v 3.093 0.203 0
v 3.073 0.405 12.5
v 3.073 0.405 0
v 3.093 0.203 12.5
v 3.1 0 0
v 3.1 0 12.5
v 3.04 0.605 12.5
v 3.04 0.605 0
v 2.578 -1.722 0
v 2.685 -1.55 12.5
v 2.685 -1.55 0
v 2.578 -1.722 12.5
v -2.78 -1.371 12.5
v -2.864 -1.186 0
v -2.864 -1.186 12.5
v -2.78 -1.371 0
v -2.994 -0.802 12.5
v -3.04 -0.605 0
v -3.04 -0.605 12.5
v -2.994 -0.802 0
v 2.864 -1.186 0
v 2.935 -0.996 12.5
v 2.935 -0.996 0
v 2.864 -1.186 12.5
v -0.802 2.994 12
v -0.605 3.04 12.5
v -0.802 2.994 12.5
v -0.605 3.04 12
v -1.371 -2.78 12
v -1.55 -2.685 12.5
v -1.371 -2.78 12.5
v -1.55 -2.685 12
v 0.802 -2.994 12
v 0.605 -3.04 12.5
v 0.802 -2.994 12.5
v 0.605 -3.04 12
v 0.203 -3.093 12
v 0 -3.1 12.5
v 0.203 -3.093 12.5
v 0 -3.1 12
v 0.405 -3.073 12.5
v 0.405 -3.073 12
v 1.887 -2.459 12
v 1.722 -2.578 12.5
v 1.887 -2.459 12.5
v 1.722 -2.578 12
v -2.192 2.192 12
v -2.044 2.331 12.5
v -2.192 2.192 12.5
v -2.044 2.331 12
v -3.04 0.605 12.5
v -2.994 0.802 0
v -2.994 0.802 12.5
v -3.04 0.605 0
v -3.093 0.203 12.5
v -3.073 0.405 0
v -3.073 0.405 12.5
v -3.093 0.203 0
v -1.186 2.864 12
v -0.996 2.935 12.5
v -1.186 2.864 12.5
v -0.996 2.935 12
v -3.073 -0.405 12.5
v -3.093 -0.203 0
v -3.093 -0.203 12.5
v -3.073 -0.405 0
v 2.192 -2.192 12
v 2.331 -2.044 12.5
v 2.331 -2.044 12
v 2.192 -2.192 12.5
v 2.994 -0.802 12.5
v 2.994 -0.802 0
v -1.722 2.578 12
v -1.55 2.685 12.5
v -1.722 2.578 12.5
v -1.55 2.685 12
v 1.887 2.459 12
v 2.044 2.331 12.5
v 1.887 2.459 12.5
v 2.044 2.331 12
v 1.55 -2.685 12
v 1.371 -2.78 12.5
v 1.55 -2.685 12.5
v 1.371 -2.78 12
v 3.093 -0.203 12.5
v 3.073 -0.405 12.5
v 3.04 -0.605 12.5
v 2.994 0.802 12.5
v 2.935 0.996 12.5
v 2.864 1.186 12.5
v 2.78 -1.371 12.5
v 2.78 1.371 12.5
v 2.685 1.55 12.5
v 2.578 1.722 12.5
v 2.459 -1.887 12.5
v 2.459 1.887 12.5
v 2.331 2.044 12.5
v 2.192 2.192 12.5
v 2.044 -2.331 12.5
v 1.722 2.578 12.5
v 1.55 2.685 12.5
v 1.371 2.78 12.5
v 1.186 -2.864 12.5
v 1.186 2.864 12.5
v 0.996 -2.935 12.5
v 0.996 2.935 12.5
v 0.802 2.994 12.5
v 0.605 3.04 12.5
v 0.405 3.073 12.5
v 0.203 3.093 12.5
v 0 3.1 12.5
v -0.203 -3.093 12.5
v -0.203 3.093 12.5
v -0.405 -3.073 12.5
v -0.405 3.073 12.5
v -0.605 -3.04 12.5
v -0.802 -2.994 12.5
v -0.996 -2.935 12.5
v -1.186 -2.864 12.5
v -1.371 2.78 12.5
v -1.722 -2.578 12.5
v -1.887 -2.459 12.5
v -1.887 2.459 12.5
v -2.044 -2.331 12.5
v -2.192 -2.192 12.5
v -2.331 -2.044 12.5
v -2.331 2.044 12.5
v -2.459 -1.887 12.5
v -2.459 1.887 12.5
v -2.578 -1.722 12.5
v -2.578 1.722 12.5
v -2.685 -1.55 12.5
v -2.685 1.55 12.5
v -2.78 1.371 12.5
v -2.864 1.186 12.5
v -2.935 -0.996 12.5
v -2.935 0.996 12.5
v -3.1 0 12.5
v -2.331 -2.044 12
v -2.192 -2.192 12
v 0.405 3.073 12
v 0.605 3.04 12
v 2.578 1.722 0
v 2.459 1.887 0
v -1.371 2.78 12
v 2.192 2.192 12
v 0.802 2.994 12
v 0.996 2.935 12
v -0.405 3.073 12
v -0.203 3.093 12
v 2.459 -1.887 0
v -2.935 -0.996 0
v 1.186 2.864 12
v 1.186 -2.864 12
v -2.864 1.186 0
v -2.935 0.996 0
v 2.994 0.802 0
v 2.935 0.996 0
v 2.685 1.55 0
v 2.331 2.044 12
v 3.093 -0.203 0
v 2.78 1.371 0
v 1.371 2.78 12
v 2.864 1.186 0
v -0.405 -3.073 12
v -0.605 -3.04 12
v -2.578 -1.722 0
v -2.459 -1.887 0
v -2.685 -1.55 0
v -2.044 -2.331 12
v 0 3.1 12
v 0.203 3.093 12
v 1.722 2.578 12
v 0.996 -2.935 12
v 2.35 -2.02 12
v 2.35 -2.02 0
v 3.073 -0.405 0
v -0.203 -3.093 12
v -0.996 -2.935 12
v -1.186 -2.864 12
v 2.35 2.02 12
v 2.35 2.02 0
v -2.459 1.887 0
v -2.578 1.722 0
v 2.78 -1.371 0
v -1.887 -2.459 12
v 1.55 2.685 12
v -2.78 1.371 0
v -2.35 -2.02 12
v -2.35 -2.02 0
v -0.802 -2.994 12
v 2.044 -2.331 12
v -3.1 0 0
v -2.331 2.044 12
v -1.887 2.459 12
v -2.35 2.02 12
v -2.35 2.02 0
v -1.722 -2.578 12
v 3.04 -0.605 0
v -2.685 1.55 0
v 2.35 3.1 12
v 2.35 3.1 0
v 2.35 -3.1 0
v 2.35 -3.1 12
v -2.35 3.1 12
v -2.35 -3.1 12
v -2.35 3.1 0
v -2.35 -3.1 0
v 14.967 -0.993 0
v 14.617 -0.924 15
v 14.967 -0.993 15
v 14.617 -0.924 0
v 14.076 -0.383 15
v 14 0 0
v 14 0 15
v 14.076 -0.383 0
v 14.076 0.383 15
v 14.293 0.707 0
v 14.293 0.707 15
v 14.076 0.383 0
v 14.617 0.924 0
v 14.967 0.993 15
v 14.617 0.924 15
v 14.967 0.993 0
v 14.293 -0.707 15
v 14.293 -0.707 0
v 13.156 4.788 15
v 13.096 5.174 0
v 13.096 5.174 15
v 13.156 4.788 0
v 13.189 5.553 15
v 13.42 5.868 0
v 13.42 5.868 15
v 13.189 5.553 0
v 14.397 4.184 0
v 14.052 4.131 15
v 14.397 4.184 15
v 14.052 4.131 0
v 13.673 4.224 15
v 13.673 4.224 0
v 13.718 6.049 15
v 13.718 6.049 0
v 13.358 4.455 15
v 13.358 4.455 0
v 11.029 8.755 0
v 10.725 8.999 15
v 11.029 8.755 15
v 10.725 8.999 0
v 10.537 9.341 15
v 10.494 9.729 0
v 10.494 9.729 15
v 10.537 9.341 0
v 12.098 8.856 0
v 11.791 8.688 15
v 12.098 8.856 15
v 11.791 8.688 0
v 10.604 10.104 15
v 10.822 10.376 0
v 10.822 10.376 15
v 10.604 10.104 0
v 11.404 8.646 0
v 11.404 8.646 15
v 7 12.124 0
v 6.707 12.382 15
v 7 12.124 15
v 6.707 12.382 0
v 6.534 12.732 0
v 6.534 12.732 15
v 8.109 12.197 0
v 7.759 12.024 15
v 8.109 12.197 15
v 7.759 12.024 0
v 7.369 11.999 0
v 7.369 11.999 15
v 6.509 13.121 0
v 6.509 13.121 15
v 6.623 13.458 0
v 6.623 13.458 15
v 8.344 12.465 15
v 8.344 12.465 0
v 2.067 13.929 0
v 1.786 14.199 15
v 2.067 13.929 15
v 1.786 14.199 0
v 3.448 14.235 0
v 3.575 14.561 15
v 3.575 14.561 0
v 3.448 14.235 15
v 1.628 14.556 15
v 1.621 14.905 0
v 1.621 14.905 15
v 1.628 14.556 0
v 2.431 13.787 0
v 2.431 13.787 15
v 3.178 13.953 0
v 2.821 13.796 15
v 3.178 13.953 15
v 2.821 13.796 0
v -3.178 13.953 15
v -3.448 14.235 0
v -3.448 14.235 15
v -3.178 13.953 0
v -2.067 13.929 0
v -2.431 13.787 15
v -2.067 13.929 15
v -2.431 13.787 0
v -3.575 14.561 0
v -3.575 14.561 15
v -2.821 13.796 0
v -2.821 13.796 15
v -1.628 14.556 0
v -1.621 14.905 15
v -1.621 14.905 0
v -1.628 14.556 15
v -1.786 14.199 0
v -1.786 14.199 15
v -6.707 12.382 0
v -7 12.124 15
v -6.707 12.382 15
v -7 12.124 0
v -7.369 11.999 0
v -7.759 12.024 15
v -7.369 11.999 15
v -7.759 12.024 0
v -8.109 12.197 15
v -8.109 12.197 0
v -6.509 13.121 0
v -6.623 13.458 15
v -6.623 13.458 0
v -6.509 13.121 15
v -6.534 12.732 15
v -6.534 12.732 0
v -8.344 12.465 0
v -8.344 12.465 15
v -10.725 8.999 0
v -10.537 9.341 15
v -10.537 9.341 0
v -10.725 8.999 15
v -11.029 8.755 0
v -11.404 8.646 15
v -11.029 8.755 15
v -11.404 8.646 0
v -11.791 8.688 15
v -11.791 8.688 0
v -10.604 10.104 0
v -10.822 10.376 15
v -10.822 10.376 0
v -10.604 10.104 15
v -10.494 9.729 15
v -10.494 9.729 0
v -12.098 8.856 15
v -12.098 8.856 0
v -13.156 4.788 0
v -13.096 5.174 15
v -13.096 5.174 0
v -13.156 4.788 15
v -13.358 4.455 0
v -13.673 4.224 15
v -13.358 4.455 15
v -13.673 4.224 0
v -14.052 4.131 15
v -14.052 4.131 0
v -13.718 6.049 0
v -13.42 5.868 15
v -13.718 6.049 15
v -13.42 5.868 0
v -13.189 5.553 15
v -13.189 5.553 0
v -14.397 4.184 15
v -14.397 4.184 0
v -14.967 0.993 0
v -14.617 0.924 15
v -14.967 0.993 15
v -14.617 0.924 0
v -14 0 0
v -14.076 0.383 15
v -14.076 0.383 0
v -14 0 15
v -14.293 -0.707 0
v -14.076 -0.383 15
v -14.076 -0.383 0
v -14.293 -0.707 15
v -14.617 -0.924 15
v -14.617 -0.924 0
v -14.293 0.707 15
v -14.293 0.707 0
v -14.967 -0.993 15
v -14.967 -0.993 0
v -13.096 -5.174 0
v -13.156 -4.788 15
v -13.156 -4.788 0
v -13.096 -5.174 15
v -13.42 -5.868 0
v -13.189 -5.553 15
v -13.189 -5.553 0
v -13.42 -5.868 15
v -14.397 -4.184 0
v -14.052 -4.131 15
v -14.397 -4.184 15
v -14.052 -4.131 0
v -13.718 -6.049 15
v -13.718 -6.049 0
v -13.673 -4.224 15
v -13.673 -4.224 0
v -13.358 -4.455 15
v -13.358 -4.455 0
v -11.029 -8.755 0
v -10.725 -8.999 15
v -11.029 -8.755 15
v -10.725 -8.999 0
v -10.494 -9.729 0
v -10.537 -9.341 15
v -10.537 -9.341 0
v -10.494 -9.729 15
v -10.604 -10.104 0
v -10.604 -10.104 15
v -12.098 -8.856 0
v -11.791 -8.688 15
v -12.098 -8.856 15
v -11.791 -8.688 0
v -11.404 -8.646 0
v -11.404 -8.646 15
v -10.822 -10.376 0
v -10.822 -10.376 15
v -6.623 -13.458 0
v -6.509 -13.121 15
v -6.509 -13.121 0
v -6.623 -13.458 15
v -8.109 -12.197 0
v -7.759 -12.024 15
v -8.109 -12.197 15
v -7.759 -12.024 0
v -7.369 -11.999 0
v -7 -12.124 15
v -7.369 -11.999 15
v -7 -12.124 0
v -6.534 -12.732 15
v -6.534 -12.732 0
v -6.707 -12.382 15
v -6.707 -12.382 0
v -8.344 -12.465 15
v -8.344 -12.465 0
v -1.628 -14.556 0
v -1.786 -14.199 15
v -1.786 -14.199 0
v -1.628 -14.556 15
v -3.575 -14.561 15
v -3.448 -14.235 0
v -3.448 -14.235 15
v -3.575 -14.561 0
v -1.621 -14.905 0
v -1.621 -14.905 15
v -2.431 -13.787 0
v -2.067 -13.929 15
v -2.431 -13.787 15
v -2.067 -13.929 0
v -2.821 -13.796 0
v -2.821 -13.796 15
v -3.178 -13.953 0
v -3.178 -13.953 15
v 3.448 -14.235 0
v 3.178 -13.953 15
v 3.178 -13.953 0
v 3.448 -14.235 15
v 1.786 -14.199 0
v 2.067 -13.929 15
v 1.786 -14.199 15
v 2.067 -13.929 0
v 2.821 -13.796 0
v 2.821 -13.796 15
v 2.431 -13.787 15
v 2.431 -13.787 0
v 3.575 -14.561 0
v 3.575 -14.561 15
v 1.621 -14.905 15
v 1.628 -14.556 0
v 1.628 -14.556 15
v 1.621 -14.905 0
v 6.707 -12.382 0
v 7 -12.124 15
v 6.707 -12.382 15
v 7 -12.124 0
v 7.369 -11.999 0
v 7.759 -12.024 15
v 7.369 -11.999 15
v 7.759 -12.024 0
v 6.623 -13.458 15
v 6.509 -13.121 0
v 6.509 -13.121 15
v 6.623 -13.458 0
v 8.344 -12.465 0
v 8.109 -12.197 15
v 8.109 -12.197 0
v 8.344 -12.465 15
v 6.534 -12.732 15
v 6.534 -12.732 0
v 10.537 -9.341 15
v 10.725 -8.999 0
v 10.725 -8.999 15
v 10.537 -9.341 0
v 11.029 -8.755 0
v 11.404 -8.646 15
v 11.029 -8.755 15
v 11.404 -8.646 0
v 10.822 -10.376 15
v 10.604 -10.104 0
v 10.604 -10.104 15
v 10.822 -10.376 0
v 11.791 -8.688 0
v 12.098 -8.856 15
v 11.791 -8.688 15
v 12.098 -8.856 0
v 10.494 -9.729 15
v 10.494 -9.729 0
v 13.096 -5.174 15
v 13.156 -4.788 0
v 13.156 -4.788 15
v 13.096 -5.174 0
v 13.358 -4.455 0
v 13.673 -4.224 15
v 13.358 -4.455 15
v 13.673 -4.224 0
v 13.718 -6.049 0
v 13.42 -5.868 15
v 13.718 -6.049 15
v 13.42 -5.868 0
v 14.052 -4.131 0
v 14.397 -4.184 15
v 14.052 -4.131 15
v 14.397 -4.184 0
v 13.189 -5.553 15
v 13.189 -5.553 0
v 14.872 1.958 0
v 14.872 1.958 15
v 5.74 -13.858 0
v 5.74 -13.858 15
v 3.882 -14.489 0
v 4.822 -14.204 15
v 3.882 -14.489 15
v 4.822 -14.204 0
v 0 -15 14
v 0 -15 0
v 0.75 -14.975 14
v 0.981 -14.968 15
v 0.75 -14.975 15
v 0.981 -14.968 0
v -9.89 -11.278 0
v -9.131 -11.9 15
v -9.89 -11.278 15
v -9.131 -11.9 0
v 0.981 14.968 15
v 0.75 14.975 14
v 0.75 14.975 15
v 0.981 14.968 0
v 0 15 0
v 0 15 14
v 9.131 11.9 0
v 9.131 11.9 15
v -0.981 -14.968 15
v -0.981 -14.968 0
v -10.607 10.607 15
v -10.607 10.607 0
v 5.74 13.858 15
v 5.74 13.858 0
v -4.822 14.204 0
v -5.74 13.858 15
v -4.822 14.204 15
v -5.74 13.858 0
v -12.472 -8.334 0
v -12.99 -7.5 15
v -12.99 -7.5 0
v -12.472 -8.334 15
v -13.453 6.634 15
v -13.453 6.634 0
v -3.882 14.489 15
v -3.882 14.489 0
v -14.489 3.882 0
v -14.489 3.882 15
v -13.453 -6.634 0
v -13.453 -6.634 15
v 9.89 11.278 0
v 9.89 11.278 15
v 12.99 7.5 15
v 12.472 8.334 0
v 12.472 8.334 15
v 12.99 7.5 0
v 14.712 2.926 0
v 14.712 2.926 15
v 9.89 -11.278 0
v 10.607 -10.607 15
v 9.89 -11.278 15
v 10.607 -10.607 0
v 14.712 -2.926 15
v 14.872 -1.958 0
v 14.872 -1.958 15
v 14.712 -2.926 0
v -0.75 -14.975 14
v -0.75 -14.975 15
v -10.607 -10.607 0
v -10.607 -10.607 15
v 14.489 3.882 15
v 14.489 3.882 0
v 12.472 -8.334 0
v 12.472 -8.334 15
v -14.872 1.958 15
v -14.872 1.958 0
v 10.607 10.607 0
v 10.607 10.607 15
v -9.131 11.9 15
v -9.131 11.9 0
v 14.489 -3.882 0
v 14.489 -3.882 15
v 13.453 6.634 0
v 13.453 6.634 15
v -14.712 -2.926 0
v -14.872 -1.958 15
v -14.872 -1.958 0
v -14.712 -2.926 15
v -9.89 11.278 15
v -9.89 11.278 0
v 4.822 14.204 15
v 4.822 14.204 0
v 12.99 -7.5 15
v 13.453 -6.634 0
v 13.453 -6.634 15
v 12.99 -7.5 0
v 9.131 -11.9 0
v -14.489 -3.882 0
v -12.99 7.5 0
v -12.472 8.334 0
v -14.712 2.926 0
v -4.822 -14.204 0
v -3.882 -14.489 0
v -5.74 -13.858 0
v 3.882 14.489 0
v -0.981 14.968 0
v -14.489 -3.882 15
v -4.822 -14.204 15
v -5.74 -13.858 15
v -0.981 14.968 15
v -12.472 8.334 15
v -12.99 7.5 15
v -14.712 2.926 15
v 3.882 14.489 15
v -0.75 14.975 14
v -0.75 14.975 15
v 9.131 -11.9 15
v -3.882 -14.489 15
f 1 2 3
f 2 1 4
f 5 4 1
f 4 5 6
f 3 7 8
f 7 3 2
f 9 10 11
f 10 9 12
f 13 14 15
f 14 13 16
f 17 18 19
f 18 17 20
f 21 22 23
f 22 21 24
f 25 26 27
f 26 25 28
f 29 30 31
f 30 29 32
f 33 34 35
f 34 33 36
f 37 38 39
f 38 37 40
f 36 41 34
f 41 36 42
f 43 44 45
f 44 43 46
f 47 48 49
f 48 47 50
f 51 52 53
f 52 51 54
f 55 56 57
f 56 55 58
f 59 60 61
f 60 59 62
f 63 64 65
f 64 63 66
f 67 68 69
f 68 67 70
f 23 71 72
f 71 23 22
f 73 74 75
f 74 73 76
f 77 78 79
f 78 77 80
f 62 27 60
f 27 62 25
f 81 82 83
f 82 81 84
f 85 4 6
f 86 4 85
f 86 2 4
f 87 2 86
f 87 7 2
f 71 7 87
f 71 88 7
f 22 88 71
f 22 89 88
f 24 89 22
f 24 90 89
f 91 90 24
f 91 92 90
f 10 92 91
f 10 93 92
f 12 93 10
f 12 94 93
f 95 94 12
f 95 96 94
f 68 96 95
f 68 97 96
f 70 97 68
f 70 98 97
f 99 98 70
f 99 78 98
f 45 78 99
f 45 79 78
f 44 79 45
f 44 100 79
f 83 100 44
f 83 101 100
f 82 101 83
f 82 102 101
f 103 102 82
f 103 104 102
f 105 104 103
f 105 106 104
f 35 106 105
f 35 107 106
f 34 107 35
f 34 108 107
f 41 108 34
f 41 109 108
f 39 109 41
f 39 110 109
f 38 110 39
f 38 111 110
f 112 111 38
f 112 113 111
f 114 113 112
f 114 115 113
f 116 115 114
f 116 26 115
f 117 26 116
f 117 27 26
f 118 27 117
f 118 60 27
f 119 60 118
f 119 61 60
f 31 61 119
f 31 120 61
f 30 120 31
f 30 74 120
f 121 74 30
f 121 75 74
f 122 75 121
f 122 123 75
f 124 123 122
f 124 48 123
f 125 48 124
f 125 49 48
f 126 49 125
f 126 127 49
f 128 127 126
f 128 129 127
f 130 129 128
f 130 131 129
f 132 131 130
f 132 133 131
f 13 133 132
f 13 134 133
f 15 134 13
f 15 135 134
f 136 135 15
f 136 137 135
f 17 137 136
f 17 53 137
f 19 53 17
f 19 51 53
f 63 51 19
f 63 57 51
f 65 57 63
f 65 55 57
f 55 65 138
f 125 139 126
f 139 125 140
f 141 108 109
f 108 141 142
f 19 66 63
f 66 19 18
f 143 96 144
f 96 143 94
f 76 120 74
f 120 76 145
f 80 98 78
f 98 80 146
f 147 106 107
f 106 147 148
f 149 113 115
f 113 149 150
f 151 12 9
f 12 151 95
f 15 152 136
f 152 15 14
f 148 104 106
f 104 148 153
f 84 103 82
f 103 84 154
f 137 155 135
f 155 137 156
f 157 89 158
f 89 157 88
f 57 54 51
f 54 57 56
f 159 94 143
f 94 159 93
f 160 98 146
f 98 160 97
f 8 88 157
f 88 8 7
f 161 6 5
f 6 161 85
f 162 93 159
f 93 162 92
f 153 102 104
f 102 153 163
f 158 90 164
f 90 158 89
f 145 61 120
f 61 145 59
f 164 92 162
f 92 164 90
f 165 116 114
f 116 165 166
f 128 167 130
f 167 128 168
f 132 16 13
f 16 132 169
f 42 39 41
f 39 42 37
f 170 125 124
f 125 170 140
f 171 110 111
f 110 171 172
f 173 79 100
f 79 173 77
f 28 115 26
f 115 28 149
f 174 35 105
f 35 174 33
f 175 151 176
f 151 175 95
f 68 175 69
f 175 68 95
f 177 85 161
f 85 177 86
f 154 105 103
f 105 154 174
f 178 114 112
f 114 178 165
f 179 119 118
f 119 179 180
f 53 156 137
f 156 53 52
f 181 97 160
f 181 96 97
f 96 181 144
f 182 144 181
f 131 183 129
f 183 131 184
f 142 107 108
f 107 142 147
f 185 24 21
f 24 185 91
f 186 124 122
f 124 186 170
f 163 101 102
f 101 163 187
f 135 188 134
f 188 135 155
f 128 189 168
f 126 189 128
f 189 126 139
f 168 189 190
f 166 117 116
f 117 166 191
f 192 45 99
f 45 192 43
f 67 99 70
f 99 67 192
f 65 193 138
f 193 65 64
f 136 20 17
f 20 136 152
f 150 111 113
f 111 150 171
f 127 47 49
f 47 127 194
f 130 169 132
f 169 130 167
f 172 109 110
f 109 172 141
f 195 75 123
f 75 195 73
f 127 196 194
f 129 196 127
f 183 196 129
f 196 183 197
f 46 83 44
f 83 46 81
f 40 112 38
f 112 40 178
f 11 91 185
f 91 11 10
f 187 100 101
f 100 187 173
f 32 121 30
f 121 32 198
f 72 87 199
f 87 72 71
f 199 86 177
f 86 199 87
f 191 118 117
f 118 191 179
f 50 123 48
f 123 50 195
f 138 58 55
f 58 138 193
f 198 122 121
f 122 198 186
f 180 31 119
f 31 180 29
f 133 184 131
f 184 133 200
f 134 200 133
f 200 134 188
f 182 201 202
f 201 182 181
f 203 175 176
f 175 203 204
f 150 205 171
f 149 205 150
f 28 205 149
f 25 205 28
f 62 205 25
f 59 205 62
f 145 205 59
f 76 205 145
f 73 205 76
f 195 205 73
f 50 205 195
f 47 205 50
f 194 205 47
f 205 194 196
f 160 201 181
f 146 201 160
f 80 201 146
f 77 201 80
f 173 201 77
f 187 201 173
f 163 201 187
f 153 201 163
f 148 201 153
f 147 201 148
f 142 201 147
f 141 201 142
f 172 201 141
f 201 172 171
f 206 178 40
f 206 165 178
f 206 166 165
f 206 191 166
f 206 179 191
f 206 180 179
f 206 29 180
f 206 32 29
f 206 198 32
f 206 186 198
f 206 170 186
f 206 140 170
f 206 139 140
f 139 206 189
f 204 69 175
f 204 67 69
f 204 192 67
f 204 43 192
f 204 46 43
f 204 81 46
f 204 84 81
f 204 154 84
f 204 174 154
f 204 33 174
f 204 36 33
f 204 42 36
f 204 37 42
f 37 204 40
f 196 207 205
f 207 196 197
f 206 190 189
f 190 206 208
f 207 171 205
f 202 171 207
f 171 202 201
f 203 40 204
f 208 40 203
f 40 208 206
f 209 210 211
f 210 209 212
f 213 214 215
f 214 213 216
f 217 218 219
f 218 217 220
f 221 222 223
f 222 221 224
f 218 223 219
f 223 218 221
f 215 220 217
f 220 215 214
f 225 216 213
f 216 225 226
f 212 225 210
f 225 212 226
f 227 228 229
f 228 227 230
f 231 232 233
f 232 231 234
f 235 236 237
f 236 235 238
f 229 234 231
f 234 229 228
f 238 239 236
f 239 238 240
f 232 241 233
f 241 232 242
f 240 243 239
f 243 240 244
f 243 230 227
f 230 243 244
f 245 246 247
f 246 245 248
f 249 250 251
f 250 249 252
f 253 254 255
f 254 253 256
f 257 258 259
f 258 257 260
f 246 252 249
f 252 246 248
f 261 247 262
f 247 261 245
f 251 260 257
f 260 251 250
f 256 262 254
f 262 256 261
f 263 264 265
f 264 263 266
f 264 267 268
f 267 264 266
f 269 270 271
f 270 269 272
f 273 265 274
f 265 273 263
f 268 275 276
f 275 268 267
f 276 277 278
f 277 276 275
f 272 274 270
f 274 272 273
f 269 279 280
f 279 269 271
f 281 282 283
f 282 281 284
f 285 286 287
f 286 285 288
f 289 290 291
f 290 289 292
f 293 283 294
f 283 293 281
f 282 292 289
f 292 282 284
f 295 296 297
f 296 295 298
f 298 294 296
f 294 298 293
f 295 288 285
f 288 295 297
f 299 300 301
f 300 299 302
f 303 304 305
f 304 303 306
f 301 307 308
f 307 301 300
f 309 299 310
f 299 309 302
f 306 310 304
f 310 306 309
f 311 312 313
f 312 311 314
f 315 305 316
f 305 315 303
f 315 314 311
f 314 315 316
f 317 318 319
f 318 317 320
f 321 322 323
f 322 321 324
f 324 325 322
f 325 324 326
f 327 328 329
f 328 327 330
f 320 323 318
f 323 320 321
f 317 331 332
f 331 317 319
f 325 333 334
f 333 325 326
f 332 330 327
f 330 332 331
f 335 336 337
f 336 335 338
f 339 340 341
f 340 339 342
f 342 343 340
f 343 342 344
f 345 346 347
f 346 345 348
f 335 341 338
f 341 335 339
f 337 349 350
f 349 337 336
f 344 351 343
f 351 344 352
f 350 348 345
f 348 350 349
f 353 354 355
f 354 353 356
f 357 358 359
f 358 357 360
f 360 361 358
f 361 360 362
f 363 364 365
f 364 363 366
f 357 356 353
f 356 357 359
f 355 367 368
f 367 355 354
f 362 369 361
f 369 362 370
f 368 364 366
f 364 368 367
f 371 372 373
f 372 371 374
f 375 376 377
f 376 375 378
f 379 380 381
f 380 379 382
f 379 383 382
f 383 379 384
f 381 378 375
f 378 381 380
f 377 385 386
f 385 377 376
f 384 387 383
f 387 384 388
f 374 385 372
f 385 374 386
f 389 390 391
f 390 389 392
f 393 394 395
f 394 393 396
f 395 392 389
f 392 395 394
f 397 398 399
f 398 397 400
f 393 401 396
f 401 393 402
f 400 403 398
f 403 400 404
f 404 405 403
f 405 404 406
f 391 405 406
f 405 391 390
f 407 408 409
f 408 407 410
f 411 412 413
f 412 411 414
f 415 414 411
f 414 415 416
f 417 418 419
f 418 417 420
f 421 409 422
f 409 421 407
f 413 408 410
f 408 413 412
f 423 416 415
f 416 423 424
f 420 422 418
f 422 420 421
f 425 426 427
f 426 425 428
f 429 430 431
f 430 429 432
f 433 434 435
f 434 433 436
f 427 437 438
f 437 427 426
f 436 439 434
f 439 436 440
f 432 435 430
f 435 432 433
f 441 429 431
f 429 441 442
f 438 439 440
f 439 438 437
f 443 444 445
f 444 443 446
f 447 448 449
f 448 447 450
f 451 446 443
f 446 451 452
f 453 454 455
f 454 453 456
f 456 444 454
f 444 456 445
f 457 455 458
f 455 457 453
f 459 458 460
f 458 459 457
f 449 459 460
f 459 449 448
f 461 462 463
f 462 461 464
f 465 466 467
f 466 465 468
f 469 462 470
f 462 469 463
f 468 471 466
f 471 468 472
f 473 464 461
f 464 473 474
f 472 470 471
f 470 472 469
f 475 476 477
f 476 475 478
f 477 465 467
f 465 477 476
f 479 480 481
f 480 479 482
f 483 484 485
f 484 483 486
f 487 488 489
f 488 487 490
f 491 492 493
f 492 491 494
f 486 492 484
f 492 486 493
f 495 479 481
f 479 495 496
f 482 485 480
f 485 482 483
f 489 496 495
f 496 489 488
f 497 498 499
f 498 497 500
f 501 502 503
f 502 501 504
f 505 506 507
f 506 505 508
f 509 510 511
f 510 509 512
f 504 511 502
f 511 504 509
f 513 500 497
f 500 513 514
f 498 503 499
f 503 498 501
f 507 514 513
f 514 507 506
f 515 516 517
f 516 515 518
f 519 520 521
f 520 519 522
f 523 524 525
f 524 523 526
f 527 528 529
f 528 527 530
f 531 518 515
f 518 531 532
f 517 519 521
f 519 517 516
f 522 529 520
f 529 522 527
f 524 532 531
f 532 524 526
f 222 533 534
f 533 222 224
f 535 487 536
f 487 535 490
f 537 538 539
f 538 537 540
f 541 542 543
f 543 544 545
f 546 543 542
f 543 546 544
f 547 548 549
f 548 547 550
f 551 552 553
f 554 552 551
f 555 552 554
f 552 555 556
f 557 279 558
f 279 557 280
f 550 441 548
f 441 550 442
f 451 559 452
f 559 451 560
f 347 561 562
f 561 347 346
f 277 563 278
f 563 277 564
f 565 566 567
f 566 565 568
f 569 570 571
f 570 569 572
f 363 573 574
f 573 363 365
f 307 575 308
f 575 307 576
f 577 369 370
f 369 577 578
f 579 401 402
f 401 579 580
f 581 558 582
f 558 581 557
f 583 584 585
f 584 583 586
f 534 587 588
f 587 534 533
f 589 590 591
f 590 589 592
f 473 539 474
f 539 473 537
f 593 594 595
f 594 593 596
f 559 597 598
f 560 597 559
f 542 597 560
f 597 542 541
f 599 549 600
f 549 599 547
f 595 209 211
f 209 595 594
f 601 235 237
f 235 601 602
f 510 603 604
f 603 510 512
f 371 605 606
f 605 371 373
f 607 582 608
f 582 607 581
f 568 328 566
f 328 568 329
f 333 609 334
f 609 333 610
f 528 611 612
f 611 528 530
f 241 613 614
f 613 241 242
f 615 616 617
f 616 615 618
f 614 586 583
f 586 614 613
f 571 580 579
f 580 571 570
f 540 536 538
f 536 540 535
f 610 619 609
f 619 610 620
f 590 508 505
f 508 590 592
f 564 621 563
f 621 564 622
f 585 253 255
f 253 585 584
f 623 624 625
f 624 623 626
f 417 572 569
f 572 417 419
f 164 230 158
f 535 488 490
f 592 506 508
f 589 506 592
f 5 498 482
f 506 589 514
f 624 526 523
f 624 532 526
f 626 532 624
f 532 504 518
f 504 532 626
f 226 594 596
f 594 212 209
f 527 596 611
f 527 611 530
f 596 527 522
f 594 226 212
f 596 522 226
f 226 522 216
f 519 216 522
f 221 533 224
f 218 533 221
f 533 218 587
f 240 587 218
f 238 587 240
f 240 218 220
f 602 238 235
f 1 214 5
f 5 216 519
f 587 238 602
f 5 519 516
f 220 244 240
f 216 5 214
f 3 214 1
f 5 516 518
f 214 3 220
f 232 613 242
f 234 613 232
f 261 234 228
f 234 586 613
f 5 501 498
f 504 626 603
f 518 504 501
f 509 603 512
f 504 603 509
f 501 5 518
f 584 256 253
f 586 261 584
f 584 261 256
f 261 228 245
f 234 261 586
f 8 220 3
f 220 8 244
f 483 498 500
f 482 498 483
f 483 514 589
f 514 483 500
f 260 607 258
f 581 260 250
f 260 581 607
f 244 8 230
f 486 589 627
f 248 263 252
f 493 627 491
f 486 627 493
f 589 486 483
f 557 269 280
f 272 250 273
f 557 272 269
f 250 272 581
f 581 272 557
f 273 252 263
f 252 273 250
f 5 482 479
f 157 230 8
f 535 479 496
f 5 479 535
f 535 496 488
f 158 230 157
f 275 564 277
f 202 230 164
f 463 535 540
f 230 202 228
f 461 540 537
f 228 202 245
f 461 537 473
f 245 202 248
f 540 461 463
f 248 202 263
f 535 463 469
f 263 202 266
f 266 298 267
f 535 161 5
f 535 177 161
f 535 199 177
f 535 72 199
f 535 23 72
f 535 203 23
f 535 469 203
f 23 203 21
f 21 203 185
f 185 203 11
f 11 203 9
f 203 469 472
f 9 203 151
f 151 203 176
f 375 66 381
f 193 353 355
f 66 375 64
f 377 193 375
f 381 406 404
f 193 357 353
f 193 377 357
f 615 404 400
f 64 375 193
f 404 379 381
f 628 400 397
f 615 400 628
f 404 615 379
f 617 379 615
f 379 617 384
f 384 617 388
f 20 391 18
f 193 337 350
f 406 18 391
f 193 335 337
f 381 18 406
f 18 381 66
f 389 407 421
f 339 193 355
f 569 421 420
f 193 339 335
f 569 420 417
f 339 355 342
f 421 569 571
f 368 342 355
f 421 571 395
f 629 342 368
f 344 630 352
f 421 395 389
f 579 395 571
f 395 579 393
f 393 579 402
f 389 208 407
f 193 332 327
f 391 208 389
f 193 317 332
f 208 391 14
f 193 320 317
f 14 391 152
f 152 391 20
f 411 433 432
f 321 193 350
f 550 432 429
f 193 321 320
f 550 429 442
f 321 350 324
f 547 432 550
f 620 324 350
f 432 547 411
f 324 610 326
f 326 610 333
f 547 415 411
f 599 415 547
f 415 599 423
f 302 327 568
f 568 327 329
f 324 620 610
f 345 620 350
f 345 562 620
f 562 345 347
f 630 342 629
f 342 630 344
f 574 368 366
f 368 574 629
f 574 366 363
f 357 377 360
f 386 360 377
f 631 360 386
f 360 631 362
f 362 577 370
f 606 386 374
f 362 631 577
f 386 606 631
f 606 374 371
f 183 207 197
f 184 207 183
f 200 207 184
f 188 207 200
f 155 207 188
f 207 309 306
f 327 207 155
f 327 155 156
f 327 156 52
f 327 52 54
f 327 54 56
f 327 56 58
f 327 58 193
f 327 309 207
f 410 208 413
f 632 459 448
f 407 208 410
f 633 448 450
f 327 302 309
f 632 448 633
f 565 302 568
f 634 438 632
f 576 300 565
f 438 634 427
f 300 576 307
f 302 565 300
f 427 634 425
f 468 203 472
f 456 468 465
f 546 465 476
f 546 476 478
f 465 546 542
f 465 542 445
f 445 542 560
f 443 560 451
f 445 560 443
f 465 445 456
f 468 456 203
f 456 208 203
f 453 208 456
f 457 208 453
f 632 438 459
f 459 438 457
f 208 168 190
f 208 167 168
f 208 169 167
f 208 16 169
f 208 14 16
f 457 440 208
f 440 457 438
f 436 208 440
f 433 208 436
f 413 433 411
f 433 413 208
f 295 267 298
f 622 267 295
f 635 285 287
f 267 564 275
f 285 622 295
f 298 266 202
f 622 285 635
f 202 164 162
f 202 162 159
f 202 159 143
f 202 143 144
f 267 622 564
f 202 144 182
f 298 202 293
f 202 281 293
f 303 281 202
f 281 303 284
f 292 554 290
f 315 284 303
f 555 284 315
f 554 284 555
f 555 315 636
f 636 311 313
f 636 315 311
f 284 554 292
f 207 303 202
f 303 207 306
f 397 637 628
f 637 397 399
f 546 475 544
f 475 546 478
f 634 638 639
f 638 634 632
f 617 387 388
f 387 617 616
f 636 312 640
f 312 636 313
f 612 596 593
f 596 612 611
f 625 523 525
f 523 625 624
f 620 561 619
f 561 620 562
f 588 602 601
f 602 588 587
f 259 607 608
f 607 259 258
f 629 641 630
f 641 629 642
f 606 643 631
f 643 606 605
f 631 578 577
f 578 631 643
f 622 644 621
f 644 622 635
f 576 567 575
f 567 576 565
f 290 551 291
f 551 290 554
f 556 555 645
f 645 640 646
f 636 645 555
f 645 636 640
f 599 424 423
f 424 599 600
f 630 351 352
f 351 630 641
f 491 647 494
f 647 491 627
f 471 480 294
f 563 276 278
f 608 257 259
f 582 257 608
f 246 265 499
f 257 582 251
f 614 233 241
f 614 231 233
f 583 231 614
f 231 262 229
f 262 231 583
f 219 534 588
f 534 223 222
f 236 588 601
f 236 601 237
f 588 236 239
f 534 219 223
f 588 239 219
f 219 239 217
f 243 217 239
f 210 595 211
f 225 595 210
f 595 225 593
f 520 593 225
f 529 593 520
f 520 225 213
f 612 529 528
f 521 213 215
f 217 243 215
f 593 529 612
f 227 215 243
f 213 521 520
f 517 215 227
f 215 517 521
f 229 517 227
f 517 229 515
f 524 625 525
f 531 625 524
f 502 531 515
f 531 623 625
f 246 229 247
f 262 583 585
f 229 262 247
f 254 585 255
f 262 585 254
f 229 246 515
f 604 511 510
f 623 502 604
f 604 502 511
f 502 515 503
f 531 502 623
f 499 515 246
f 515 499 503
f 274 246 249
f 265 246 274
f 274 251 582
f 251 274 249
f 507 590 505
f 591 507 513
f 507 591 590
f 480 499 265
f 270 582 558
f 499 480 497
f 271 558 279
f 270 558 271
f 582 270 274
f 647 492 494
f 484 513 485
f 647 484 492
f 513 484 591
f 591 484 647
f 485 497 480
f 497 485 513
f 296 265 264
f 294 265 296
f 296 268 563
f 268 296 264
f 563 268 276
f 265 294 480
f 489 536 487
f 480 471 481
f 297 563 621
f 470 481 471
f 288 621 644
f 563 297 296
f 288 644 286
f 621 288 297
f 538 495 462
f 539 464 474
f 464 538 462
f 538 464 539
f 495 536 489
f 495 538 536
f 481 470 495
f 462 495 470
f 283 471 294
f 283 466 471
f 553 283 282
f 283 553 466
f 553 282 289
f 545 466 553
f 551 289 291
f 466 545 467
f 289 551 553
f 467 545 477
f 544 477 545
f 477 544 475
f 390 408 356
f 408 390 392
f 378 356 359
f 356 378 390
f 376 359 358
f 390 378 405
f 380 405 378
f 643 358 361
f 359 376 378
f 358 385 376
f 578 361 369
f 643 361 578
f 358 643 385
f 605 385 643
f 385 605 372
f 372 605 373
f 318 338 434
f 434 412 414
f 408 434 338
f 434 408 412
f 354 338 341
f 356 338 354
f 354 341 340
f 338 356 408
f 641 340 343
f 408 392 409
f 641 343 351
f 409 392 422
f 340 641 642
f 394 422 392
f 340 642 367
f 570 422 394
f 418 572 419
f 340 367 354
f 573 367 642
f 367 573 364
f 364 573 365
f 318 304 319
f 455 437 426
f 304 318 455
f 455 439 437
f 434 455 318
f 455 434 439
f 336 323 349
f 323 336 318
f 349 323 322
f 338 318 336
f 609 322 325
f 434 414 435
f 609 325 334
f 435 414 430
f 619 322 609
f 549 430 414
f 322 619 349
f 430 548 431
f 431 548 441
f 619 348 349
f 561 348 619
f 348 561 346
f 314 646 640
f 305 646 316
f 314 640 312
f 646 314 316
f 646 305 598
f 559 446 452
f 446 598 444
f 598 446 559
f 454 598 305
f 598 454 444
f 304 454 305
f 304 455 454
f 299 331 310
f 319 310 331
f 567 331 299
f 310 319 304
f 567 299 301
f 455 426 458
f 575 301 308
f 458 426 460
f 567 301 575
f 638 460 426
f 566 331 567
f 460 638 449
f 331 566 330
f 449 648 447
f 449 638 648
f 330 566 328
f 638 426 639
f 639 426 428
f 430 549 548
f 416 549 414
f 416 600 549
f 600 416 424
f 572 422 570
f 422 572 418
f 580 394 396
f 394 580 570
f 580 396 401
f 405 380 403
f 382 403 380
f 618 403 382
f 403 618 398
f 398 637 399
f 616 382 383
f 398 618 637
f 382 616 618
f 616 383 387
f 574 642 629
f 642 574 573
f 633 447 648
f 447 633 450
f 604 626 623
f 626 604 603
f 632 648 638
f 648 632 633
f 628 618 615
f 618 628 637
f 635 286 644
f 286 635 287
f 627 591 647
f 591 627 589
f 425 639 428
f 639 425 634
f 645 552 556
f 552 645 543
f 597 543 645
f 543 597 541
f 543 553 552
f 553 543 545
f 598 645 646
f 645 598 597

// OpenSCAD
// Replacement knob for hotplate stirrer (D-shaft 6 mm)
// Print orientation: bottom face (with bore) on bed at z = 0

$fn = 96;

// --- Knob body ---
knob_d      = 30;   // outer diameter
knob_h      = 15;   // height

// --- D-bore (blind, from bottom face) ---
bore_d      = 6.2;  // circle diameter
bore_flat   = 4.7;  // distance from flat to opposite side
bore_depth  = 12;   // depth from bottom face

// --- Grip grooves ---
groove_n    = 18;   // number of grooves
groove_d    = 2;    // groove diameter (half-cylinder)

// --- Pointer groove ---
pointer_w   = 1.5;  // groove width
pointer_d   = 1;    // groove depth

// --- Cutting overlap ---
eps         = 0.5;  // extension past cut faces

difference() {
    // Main body, centred in X/Y, resting on z = 0
    cylinder(d = knob_d, h = knob_h);

    // D-shaped bore: circle with one side cut flat
    translate([0, 0, -eps])
        union() {
            cylinder(d = bore_d, h = bore_depth + 2 * eps);
            translate([-bore_flat / 2, -bore_d / 2, 0])
                cube([bore_flat, bore_d, bore_depth + eps]);
        }

    // Vertical grip grooves along full height
    for (i = [0 : groove_n - 1])
        rotate([0, 0, i * 360 / groove_n])
            translate([knob_d / 2, 0, -eps])
                cylinder(d = groove_d, h = knob_h + 2 * eps, $fn = 16);

    // Pointer groove from centre to outer edge
    translate([0, 0, knob_h - pointer_d])
        linear_extrude(height = pointer_d + eps)
            polygon([[-pointer_w / 2, knob_d / 2],
                     [ pointer_w / 2, knob_d / 2],
                     [ pointer_w / 2, -knob_d / 2],
                     [-pointer_w / 2, -knob_d / 2]]);
}
